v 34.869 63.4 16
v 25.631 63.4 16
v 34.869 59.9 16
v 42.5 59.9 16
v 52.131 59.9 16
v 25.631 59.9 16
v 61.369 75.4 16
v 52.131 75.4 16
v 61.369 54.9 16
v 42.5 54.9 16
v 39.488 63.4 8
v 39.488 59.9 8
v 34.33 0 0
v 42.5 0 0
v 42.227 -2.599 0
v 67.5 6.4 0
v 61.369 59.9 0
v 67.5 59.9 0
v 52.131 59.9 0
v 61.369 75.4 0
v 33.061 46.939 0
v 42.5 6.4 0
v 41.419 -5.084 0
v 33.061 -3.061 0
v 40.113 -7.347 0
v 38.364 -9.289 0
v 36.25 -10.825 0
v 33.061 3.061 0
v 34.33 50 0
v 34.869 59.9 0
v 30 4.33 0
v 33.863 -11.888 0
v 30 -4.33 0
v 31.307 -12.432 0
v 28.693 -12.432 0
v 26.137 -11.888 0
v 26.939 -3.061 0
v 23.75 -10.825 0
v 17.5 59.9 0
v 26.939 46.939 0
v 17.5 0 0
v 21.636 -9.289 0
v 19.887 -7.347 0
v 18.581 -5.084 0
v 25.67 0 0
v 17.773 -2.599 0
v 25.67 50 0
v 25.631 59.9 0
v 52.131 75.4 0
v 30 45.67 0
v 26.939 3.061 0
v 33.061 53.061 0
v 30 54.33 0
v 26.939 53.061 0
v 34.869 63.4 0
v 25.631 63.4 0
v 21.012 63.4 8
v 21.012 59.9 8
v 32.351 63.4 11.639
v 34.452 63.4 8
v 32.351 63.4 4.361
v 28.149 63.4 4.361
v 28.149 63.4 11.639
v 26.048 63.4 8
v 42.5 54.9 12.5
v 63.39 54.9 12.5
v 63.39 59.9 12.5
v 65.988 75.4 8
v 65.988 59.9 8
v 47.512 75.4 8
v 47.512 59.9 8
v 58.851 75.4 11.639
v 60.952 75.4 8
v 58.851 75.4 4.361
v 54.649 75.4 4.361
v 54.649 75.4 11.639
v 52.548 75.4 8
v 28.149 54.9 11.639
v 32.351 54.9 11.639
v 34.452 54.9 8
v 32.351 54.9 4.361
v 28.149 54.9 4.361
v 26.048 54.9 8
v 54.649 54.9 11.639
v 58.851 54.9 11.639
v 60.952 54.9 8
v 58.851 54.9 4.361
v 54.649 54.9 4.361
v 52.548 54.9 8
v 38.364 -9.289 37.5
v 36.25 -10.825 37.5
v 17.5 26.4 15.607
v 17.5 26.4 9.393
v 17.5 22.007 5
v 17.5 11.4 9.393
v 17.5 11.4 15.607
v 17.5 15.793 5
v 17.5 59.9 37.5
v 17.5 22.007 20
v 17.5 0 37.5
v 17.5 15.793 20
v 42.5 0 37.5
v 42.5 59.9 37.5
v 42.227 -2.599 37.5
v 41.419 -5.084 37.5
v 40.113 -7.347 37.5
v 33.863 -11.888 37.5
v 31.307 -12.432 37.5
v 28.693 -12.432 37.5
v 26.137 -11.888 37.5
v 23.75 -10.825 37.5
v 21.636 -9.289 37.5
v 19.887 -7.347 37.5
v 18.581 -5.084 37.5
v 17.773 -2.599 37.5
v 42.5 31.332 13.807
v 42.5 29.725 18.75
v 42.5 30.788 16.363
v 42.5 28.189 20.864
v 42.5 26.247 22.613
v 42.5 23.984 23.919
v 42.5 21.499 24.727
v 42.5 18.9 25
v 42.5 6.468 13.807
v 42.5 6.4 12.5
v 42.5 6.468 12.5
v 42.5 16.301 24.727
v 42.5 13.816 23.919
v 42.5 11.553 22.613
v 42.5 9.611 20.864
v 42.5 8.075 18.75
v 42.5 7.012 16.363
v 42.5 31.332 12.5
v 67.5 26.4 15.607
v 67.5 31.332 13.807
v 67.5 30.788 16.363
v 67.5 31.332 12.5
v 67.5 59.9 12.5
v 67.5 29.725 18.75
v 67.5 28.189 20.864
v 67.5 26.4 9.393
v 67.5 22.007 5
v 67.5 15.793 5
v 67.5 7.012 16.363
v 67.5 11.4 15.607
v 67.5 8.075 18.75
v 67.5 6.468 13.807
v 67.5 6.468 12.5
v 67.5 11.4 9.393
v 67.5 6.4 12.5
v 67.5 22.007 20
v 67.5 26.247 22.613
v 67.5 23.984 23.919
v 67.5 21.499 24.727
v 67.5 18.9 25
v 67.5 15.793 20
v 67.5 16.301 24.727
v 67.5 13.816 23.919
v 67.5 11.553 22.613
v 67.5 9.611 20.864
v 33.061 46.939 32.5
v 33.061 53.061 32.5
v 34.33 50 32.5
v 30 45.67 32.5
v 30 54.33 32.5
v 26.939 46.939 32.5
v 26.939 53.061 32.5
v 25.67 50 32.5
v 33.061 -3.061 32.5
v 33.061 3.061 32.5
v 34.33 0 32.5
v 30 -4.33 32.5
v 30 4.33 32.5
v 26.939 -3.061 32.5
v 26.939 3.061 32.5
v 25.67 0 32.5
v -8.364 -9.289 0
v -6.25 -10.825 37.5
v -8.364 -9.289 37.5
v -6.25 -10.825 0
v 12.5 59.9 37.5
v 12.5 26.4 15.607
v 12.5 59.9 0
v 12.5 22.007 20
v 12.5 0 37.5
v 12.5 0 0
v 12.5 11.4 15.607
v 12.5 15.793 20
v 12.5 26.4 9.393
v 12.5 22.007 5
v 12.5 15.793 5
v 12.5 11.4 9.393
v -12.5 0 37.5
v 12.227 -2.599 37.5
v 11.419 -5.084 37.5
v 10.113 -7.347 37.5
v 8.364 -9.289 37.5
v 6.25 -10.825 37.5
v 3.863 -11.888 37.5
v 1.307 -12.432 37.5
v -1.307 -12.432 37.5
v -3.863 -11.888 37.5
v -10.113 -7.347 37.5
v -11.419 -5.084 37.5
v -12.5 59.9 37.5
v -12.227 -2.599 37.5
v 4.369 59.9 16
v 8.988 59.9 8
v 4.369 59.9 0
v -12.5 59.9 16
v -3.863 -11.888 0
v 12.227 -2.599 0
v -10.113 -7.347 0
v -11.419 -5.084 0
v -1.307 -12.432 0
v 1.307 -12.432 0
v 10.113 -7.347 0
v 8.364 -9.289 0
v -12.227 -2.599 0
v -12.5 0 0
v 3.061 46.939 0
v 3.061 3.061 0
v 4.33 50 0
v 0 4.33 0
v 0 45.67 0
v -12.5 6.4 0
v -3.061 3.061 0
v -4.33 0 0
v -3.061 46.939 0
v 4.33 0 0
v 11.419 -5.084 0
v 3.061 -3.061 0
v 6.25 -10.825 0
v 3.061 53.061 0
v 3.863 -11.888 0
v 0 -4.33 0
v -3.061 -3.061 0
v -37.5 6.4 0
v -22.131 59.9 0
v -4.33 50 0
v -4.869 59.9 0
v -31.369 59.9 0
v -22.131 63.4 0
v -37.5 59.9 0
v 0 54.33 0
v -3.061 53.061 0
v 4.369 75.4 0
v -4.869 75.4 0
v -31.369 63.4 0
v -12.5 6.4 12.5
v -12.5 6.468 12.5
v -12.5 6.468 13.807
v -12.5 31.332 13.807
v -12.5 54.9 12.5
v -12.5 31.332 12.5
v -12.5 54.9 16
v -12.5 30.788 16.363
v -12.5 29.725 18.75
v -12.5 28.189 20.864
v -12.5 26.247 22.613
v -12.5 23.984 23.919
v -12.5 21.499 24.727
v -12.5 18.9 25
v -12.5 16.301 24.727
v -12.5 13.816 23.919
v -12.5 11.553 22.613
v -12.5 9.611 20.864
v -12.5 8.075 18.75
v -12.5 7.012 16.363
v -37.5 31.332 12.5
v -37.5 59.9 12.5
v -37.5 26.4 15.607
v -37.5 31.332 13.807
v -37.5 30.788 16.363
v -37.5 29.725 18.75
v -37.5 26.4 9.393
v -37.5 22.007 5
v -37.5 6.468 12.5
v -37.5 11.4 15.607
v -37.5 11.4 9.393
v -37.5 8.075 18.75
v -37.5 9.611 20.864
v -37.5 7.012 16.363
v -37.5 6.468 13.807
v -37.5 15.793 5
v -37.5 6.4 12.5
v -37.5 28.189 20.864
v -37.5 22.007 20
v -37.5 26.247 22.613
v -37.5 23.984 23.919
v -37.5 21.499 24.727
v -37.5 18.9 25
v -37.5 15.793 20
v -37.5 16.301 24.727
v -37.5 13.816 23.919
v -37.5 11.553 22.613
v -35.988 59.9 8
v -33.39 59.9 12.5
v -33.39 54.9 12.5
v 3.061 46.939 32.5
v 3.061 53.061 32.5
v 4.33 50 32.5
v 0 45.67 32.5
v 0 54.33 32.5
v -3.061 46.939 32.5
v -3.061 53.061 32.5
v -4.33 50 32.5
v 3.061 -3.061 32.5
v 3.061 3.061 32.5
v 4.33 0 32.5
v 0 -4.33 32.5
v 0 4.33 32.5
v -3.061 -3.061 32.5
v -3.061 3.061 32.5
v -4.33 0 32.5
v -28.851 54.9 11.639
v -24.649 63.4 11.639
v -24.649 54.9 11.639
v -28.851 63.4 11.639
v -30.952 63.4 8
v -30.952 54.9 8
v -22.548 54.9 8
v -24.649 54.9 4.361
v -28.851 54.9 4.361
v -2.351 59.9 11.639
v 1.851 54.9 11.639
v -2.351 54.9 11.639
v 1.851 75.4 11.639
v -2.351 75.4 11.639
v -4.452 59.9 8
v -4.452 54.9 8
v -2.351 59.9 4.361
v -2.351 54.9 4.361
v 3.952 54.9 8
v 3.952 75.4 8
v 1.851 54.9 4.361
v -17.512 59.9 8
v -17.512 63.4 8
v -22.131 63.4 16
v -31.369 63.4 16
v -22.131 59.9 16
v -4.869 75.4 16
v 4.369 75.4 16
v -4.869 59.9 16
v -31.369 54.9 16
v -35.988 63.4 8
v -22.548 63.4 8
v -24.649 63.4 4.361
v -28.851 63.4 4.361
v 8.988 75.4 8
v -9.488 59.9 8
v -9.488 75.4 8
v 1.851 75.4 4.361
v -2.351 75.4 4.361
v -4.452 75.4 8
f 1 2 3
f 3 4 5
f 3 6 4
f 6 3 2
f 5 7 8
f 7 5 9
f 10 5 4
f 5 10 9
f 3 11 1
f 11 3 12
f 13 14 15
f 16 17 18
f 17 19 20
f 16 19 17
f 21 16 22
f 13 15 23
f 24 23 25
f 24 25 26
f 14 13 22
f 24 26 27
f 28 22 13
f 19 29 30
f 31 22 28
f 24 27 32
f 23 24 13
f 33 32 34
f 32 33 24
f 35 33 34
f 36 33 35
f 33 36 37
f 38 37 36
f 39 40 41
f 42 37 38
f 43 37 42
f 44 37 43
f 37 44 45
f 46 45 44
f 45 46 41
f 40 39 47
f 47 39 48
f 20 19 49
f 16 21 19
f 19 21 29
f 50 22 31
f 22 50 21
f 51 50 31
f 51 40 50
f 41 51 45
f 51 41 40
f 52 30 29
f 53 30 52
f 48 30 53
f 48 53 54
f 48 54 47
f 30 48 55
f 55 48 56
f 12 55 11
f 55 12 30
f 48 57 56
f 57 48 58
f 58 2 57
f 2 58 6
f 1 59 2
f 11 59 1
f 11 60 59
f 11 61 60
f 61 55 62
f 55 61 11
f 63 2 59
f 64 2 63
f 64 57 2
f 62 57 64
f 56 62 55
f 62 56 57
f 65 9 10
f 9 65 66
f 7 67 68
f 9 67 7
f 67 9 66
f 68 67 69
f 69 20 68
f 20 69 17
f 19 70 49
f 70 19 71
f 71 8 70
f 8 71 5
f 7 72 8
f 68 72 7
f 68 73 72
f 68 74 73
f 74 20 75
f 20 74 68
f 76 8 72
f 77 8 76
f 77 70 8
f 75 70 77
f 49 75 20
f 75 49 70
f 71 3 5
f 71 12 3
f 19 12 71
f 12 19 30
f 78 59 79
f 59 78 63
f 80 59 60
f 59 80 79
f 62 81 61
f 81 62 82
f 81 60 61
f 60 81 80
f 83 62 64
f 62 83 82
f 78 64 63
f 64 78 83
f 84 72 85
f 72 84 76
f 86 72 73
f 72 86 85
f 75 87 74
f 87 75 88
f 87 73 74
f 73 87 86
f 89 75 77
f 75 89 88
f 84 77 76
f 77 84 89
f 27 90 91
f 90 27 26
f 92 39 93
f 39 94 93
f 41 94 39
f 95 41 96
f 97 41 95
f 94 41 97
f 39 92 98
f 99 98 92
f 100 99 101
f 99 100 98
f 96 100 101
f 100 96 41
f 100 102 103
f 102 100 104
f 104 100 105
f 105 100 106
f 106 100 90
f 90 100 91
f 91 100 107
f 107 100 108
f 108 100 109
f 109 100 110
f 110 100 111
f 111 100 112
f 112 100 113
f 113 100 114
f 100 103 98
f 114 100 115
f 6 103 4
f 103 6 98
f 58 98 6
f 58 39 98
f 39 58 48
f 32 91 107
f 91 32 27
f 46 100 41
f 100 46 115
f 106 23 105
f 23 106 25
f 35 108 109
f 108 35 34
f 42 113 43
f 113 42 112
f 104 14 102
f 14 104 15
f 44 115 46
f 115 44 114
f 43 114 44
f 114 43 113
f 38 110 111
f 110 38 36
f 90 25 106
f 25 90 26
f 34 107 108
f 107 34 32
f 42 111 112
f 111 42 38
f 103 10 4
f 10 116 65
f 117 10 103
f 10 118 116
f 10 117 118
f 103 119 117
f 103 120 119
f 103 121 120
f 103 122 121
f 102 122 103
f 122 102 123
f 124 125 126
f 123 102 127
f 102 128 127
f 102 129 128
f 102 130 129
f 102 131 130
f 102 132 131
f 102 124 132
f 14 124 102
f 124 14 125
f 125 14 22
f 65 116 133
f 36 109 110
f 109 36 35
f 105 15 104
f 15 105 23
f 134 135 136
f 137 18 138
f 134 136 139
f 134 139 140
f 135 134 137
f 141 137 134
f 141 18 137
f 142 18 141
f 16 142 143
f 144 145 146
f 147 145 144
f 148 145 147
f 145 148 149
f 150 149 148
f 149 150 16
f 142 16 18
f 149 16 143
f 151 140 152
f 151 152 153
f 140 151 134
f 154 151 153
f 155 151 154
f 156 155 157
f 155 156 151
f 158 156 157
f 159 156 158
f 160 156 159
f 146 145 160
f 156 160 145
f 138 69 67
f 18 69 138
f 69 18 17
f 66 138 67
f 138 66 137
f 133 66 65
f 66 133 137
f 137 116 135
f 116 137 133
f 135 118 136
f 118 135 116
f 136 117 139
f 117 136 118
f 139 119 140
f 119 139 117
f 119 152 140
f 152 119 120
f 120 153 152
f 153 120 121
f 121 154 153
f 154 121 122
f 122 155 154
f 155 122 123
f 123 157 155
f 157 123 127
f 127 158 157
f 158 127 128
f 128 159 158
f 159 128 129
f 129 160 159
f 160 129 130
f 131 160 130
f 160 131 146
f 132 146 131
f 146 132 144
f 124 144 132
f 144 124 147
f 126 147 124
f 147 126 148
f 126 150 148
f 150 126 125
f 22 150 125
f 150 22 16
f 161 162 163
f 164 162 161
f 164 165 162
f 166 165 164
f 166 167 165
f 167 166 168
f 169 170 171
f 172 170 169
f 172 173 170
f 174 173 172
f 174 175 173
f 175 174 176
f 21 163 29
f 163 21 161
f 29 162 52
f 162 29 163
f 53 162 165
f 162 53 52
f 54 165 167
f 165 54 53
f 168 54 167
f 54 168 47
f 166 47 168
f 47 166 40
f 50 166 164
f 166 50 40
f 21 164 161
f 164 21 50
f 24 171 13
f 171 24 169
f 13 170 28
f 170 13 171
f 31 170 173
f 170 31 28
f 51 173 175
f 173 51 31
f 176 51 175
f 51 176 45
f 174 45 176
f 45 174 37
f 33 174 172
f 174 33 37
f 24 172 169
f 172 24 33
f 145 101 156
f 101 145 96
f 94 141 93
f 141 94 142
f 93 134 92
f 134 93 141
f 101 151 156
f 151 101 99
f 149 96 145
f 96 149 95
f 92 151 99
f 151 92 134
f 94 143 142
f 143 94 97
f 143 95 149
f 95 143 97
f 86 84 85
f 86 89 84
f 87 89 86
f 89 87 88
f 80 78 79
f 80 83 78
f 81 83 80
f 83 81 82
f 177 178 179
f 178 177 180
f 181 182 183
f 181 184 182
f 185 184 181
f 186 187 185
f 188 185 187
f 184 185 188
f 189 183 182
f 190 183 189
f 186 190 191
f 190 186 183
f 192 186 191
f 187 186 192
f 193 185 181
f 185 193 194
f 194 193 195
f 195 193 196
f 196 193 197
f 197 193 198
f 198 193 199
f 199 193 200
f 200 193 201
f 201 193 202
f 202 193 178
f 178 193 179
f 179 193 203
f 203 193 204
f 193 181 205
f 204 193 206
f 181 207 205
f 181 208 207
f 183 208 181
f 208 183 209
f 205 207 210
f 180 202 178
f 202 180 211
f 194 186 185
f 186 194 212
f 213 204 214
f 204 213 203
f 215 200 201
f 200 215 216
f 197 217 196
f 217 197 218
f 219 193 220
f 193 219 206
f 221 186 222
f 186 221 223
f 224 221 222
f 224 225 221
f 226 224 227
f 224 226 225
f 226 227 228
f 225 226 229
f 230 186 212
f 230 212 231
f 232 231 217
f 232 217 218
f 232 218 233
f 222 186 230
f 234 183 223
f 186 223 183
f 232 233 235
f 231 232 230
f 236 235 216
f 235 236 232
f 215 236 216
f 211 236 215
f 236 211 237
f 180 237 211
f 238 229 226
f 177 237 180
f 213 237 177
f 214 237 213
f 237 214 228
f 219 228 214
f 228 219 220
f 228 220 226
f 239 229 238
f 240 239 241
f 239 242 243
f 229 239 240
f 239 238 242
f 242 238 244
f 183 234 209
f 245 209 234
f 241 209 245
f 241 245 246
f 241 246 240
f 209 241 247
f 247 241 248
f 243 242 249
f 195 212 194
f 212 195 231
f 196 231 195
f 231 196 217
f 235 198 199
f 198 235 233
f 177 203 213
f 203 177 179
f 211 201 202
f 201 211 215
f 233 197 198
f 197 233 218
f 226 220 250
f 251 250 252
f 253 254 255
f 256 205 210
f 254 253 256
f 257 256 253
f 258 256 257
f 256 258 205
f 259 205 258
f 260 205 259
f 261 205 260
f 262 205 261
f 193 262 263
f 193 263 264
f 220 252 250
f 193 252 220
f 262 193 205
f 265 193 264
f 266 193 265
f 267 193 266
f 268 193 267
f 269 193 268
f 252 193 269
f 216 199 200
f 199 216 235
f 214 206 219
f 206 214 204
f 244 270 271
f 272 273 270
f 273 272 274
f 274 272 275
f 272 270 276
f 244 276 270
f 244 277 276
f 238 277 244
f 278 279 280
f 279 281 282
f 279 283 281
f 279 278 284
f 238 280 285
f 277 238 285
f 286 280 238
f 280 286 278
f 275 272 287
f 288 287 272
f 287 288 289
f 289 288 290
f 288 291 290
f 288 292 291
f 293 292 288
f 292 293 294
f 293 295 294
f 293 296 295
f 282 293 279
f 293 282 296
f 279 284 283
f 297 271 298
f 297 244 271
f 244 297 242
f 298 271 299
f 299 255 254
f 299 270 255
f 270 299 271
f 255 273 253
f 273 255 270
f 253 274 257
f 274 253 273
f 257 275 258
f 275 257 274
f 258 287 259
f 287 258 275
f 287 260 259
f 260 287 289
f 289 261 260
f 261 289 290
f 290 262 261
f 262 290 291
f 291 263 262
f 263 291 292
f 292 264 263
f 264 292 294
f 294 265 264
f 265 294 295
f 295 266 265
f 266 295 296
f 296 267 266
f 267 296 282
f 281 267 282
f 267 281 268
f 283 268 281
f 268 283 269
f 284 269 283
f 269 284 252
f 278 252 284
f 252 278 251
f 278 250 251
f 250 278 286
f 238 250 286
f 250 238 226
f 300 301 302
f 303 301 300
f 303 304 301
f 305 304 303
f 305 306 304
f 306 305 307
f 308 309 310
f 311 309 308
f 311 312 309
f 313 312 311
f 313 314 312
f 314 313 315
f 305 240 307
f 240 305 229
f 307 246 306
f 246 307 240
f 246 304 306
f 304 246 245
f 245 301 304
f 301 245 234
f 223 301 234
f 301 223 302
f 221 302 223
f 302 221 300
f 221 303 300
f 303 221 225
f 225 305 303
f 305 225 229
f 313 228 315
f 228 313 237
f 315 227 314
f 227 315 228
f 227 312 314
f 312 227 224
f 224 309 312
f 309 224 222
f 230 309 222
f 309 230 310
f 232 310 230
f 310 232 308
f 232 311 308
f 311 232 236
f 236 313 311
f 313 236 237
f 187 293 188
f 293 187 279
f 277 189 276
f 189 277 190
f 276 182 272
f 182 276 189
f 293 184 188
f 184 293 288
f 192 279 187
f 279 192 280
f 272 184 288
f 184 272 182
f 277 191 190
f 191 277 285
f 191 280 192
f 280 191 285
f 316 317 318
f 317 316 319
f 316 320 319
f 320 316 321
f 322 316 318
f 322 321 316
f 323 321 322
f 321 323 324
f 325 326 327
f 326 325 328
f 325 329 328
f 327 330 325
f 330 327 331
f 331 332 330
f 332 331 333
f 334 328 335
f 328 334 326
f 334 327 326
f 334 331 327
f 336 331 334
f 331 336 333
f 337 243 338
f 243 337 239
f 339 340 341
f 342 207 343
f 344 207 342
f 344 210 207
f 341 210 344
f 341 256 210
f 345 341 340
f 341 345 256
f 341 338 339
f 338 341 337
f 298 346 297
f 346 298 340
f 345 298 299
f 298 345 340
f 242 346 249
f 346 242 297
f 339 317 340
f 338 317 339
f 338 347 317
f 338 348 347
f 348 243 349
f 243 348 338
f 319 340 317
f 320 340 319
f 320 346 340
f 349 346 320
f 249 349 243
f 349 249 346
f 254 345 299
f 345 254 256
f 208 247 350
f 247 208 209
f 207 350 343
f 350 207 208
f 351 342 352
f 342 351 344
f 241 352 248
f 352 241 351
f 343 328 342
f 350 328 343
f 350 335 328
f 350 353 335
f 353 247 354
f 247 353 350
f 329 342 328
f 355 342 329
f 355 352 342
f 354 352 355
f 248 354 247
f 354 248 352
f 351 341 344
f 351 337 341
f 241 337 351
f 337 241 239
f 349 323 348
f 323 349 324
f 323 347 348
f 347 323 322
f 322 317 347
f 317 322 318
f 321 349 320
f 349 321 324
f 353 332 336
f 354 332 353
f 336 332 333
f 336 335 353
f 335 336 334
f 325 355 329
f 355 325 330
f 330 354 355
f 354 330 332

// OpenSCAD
// file: bearing_retainer.scad
// Retainer for belt-carrying bearings.  
// Print 8.
// (c) 2014, Christopher "ScribbleJ" Jansen
include <common.scad>

retainer();
translate([calc_retainer_or*2 + 5,0,0]) retainer(false);


module display_retainer()
{
  $fn = 64;
  retainer();
  translate([0,0,retainer_lip_thick + belt_w + retainer_lip_thick]) rotate([180,0,0]) retainer(false);
  %color("grey") translate([0,0,calc_retainer_b_off]) linear_extrude(height=bearing_w)
    ring(bearing_hole_r,bearing_r);
}


module retainer(inner=true)
{
  $fn = 64;
  difference()
  {
    union()
    {
      linear_extrude(height=retainer_lip_thick) ring(bearing_r - retainer_inner_width, bearing_r + retainer_shell_thick*2 + retainer_shell_sep+belt_thick);
      if(inner)
      {
        linear_extrude(height=calc_retainer_b_off + bearing_w) ring(bearing_r, bearing_r+retainer_shell_thick);
      }
      else
      {
        linear_extrude(height=retainer_lip_thick + belt_w) ring(bearing_r+retainer_shell_thick+retainer_shell_sep, bearing_r+retainer_shell_thick*2 + retainer_shell_sep);
      }
    }
    if(inner)
      translate([0,0,calc_retainer_b_off]) cylinder(r=bearing_r,h=bearing_w);
    else
      translate([0,0,calc_retainer_b_off]) cylinder(r=bearing_r+retainer_shell_thick+retainer_shell_sep,h=bearing_w);
  }
}
// file: vars.scad
// Variables used throughout design.
// Yes, these could use some commenting.
// (c) 2014, Christopher "ScribbleJ" Jansen
huge=500;

printer_w = 400;
printer_l = 400;
printer_h = 400;

bearing_w = 7;
bearing_d = 22;
bearing_r = bearing_d/2;
bearing_hole_d = 8;
bearing_hole_r = bearing_hole_d/2;


misc_bolt_d = 3.2;
misc_bolt_r = misc_bolt_d/2;
misc_nut_r  = misc_bolt_d;
misc_bolt_pitch = 0.5;
misc_bolthead_d = misc_bolt_d*2;
misc_bolthead_r = misc_bolthead_d/2;

retainer_shell_thick = 0.5;
retainer_shell_sep   = 0.25;
//retainer_lip_thick   = 1;
retainer_lip_thick   = 2;
retainer_inner_width = 1;

belt_w    = 6;
belt_thick= 2;
belt_sep  = retainer_lip_thick*2 + 2;

calc_retainer_h  = retainer_lip_thick*2 + belt_w;
calc_retainer_ir = bearing_r + retainer_shell_thick*2 + retainer_shell_sep;
calc_retainer_or = calc_retainer_ir + belt_thick;
calc_retainer_b_off = retainer_lip_thick - (bearing_w-belt_w)/2;

tslot_w = 20;
tslot_bolt_d = 5;
tslot_bolt_r = tslot_bolt_d/2;
tslot_bolt_l = 4;
tslot_bolthead_d = 10;
tslot_bolthead_r = tslot_bolthead_d/2;


corner_thick = 5;
corner_length = tslot_w*3;

rod_d=8;
rod_r=rod_d/2;

bushing_d=15;
bushing_r=bushing_d/2;
bushing_l=10;
bushing_flange_r = bushing_r+3;
bushing_flange_w = 1;
bushing_material_thick = 5;

x_rod_sep = 50;
x_carriage_l = 50;
x_mount_sep_x = x_carriage_l - misc_bolthead_r*2*2 - misc_bolt_r*2;
x_mount_offset = bushing_r + misc_bolt_r * 2;
belt_above_x = bushing_r+misc_nut_r*2;
belt_clamp_w = 7;
x_rod_past_bearing = 20;

//belt_above_y = belt_above_x + x_rod_sep/2;
//y_above_x = belt_above_x-belt_above_y;
belt_above_y = 45;
y_above_x = belt_above_x-belt_above_y;




bearing_mount_base = corner_thick;
bearing_mount_extra = 2;
belt_above_bearing_mount = bearing_mount_base + bearing_mount_extra + retainer_lip_thick;
bearing_mount_support_tweak = 30;

y_bearing_offset = bushing_r+bushing_material_thick-calc_retainer_ir;

y_bearing_sep_y = calc_retainer_ir*2+belt_thick;
y_bearing_sep_z = belt_w+belt_sep;
bearing_bolt_r  = 4;
bearing_bolt_pitch = 1.25;
bearing_bolt_holder_thick = 4;
y_carriage_from_tslot = 2;

y_carriage_len = 50;

motor_w = 42.3;
motor_h = motor_w;
motor_bolt_sep = 31.0;
motor_bolt_r   = 1.5;
motor_pulley_d = 10;
motor_pulley_r = motor_pulley_d/2;
motor_pulley_h = 5.3;
motor_flange_d = 23;
motor_flange_r = motor_flange_d/2;
motor_corner_extra_hole_pos = tslot_bolt_r+3;

calc_corner_from_y_rod = x_rod_past_bearing+corner_thick+y_carriage_from_tslot+tslot_w;
calc_corner_above_x = belt_above_x - belt_above_bearing_mount + bearing_mount_base;

calc_motor1_above_x  = belt_above_x - motor_pulley_h;
calc_motor2_above_x  = belt_above_x - motor_pulley_h + belt_w + belt_sep;
calc_motor_from_y_rod = -bushing_r - bushing_material_thick + bearing_bolt_holder_thick + bearing_bolt_r + calc_retainer_or + motor_pulley_r;

motor_bracket_thick = 12;
motor_bracket_wide = (motor_w - motor_flange_d) / 2;
motor_bracket_len  = motor_w;
motor_bolt_offset  = (motor_w - motor_bolt_sep) / 2;

z_rod_sep = 150;
z_motor_off = motor_h - tslot_w - corner_thick;

laser_mat_thick = 4.75;
laser_mat_margin = laser_mat_thick;
bed_mount_sep   = 209;
bed_from_z      = 60;
bed_box_r       = 25;
bed_box_h       = 50;
z_ends_sep = printer_l - tslot_w*2 - corner_thick*2 - motor_w;
platform_l      =  laser_mat_margin*2 + laser_mat_thick*2 + bed_box_r*2 + z_ends_sep;
platform_w      = bed_mount_sep + misc_bolt_r*2 + laser_mat_margin*2;
z_leadscrew_passthrough_r = 12/2;
leadscrew_bolt_offset = 22/2;
leadscrew_bolt_r = 3.2/2;
laser_bushing_fudge = 0.1;


lm8uu_d=15;
lm8uu_r=lm8uu_d/2;
lm8uu_bolt_r=5/2;
lm8uu_nut_r=10/2;

arduino_width=60;
// file: bearing_mount.scad
// Bearing Mounting
// Used in other parts.  None to be printed directly.
// (c) 2014, Christopher "ScribbleJ" Jansen
include <common.scad>
use <bearing_retainer.scad>

module display_bearing_mount(x_sep=y_bearing_sep_y,z_sep=y_bearing_sep_z,base_height=bearing_mount_base,extra_height=bearing_mount_extra,v=32,a=0)
{
  translate([0,0,5+2])
  {
    %display_retainer();
    %translate([x_sep,0,z_sep]) display_retainer();
  }
  bearing_mount(x_sep,z_sep,v=v,a=a);
}

module bearing_mount(x_sep=y_bearing_sep_y,z_sep=y_bearing_sep_z,base_height=bearing_mount_base,extra_height=bearing_mount_extra,v=32,a=0)
{
  difference()
  {
    union()
    {
      rotate([0,0,a]) polyhole(r=bearing_bolt_r+bearing_bolt_holder_thick,h=calc_retainer_b_off+base_height+extra_height,$fn=v);
      translate([x_sep,0,0]) rotate([0,0,a]) polyhole(r=bearing_bolt_r+bearing_bolt_holder_thick, h=calc_retainer_b_off+z_sep+base_height+extra_height,$fn=v);
      translate([0,-(bearing_bolt_r+bearing_bolt_holder_thick),0]) cube([x_sep,(bearing_bolt_r+bearing_bolt_holder_thick)*2,base_height]);
    }

    translate([0,0,-1])
    {
      polyhole(r=smallhole(bearing_bolt_r,bearing_bolt_pitch),h=calc_retainer_b_off+base_height+extra_height+2,v=v,a=a);
      translate([x_sep,0,0]) polyhole(r=smallhole(bearing_bolt_r,bearing_bolt_pitch), h=calc_retainer_b_off+z_sep+base_height+extra_height+2,v=v,a=a);
    }


  }
}
// file: common.scad
// Common functions used in various places throughout.
// (c) 2014, Christopher "ScribbleJ" Jansen
include <vars.scad>

// Reduce radius of holes intended to hold bolts by threads.
// 0.86603 * p = nominal depth of threads.  1/3-1/2 of that is about right.
function smallhole(r,p) = r - ((p*0.86603)/3);

// Polyhole derived from Nophead's Polyhole work: http://hydraraptor.blogspot.com/2011/02/polyholes.html
module polyhole(r,h,v=6,a=0)
{
  rotate([0,0,a]) cylinder( h = h, r = r  / cos( 180 / v ), $fn = v );
}
// 2D version of Polyhole
module polycircle(r,v=6,a=0)
{
  rotate([0,0,a]) circle(r = r  / cos( 180 / v ), $fn = v );
}
// Cutout for bolthole
module bolt(bolt_r = misc_bolt_r,bolthead_r = misc_bolthead_r,bolt_len = huge,v=6,a=0)
{
  translate([0,0,-bolt_len]) polyhole(r=bolt_r,h=bolt_len+1,v=v,a=a);
  polyhole(r=bolthead_r,h=huge,v=v,a=a);
}
// 2D ring
module ring(inner=5,outer=10,v=32)
{
  difference()
  {
    circle(r=outer);
    polycircle(r=inner,v=v);
  }
} 
// 2D Rounded square
module roundsquare(dim=[50,50],r=5)
{
  translate([0,r]) square([dim[0], dim[1] - r*2]);
  translate([r,0]) square([dim[0] - r*2, dim[1]]);
  for(x=[r,dim[0]-r])
  for(y=[r,dim[1]-r])
    translate([x,y]) circle(r=r);
}
// Lasercutting Tabs
module maketabs(l=100,w=5,num=10)
{
  tablength=l/(num * 2);
  for(x=[tablength/2:tablength*2:l])
    translate([x,0]) square([tablength,w]);
}
// Support for printing bearing mount
module support(l=bearing_mount_base+bearing_mount_extra+y_bearing_sep_z+calc_retainer_b_off,w=bearing_hole_d * tan(180/6) *2,extra=0,extra_l=0)
{
  translate([-w/2,0,-l]) 
  {
    difference()
    {
      rotate([45,0,0]) cube([w,huge/2,huge/2]);
      translate([-huge/2,0,0]) cube([huge,huge,huge]);
      translate([-huge/2,-huge/2,l]) cube([huge,huge,huge]);
    }
    translate([0,-extra,-extra_l/2]) cube([w,extra,extra_l]);
  }

}
// main file
// Y-Carriage
// Print 1 of y_carriage(false), 1 of mirror([1,0,0]) y_carriage(true)
// (c) 2014, Christopher "ScribbleJ" Jansen
include <common.scad>
use <bearing_mount.scad>

print_y_carriages();

module print_y_carriages()
{

translate([bushing_r*2 + bushing_material_thick*2 + 5,0,0]) y_carriage();
mirror([1,0,0]) y_carriage(true);

}

module y_carriage(left = false)
{
  part_width = bushing_r*2+bushing_material_thick*2;

  // Bearing Mount
  if(left)
  {
    translate([y_bearing_offset + y_bearing_sep_y, x_rod_sep + belt_above_x - belt_above_bearing_mount, bearing_bolt_r+bearing_bolt_holder_thick]) rotate([-90,180,0]) display_bearing_mount(v=6);
  }
  else
  {
    translate([y_bearing_offset, x_rod_sep + belt_above_x - belt_above_bearing_mount, bearing_bolt_r+bearing_bolt_holder_thick]) rotate([-90,0,0]) display_bearing_mount(v=6);
  }

  difference()
  {
    union()
    {
      // X-rod holders
      linear_extrude(height = part_width/2 + x_rod_past_bearing + corner_thick)
      {
        translate([-part_width/2,0]) square([part_width, x_rod_sep + belt_above_x - belt_above_bearing_mount + bearing_mount_base]);
        circle(r=part_width/2);
      }

      // Y-rod passthrough
      translate([0,x_rod_sep+y_above_x,0]) 
      rotate([0,90,0])
//      linear_extrude(height = y_bearing_sep_y + y_bearing_offset)
      linear_extrude(height = y_carriage_len-part_width/2)
      {
        translate([-part_width/2,0]) circle(r=part_width/2);
        //translate([-part_width,0]) circle(r=misc_nut_r);
        translate([-part_width/2,-part_width/2]) 
          square([part_width/2, part_width/2 + belt_above_y - belt_above_bearing_mount + bearing_mount_base]);
      }
    }

    // X-rod holes
    translate([0,0,-1]) linear_extrude(height = part_width/2 + x_rod_past_bearing + 1)
    {
      polycircle(r=rod_r,v=8); 
      translate([0,x_rod_sep]) polycircle(r=rod_r,v=8);
    }

    // Y-rod hole
    translate([-huge/2,x_rod_sep+y_above_x,part_width/2]) rotate([0,90,0]) polyhole(r=bushing_r,h=huge,v=8,a=22.5);
    //translate([-huge/2,y_above_x,part_width]) rotate([0,90,0]) polyhole(r=smallhole(misc_bolt_r,misc_bolt_pitch),h=huge,v=8,a=22.5);

    // Clear bearing mount holes
    translate([y_bearing_offset + y_bearing_sep_y, x_rod_sep + belt_above_x - belt_above_bearing_mount, bearing_bolt_r+bearing_bolt_holder_thick]) rotate([-90,0,0]) polyhole(r=smallhole(bearing_hole_r,bearing_bolt_pitch),h=huge,v=6);
    translate([y_bearing_offset, x_rod_sep + belt_above_x - belt_above_bearing_mount, bearing_bolt_r+bearing_bolt_holder_thick]) rotate([-90,0,0]) polyhole(r=smallhole(bearing_hole_r,bearing_bolt_pitch),h=huge,v=6);

  }
}
